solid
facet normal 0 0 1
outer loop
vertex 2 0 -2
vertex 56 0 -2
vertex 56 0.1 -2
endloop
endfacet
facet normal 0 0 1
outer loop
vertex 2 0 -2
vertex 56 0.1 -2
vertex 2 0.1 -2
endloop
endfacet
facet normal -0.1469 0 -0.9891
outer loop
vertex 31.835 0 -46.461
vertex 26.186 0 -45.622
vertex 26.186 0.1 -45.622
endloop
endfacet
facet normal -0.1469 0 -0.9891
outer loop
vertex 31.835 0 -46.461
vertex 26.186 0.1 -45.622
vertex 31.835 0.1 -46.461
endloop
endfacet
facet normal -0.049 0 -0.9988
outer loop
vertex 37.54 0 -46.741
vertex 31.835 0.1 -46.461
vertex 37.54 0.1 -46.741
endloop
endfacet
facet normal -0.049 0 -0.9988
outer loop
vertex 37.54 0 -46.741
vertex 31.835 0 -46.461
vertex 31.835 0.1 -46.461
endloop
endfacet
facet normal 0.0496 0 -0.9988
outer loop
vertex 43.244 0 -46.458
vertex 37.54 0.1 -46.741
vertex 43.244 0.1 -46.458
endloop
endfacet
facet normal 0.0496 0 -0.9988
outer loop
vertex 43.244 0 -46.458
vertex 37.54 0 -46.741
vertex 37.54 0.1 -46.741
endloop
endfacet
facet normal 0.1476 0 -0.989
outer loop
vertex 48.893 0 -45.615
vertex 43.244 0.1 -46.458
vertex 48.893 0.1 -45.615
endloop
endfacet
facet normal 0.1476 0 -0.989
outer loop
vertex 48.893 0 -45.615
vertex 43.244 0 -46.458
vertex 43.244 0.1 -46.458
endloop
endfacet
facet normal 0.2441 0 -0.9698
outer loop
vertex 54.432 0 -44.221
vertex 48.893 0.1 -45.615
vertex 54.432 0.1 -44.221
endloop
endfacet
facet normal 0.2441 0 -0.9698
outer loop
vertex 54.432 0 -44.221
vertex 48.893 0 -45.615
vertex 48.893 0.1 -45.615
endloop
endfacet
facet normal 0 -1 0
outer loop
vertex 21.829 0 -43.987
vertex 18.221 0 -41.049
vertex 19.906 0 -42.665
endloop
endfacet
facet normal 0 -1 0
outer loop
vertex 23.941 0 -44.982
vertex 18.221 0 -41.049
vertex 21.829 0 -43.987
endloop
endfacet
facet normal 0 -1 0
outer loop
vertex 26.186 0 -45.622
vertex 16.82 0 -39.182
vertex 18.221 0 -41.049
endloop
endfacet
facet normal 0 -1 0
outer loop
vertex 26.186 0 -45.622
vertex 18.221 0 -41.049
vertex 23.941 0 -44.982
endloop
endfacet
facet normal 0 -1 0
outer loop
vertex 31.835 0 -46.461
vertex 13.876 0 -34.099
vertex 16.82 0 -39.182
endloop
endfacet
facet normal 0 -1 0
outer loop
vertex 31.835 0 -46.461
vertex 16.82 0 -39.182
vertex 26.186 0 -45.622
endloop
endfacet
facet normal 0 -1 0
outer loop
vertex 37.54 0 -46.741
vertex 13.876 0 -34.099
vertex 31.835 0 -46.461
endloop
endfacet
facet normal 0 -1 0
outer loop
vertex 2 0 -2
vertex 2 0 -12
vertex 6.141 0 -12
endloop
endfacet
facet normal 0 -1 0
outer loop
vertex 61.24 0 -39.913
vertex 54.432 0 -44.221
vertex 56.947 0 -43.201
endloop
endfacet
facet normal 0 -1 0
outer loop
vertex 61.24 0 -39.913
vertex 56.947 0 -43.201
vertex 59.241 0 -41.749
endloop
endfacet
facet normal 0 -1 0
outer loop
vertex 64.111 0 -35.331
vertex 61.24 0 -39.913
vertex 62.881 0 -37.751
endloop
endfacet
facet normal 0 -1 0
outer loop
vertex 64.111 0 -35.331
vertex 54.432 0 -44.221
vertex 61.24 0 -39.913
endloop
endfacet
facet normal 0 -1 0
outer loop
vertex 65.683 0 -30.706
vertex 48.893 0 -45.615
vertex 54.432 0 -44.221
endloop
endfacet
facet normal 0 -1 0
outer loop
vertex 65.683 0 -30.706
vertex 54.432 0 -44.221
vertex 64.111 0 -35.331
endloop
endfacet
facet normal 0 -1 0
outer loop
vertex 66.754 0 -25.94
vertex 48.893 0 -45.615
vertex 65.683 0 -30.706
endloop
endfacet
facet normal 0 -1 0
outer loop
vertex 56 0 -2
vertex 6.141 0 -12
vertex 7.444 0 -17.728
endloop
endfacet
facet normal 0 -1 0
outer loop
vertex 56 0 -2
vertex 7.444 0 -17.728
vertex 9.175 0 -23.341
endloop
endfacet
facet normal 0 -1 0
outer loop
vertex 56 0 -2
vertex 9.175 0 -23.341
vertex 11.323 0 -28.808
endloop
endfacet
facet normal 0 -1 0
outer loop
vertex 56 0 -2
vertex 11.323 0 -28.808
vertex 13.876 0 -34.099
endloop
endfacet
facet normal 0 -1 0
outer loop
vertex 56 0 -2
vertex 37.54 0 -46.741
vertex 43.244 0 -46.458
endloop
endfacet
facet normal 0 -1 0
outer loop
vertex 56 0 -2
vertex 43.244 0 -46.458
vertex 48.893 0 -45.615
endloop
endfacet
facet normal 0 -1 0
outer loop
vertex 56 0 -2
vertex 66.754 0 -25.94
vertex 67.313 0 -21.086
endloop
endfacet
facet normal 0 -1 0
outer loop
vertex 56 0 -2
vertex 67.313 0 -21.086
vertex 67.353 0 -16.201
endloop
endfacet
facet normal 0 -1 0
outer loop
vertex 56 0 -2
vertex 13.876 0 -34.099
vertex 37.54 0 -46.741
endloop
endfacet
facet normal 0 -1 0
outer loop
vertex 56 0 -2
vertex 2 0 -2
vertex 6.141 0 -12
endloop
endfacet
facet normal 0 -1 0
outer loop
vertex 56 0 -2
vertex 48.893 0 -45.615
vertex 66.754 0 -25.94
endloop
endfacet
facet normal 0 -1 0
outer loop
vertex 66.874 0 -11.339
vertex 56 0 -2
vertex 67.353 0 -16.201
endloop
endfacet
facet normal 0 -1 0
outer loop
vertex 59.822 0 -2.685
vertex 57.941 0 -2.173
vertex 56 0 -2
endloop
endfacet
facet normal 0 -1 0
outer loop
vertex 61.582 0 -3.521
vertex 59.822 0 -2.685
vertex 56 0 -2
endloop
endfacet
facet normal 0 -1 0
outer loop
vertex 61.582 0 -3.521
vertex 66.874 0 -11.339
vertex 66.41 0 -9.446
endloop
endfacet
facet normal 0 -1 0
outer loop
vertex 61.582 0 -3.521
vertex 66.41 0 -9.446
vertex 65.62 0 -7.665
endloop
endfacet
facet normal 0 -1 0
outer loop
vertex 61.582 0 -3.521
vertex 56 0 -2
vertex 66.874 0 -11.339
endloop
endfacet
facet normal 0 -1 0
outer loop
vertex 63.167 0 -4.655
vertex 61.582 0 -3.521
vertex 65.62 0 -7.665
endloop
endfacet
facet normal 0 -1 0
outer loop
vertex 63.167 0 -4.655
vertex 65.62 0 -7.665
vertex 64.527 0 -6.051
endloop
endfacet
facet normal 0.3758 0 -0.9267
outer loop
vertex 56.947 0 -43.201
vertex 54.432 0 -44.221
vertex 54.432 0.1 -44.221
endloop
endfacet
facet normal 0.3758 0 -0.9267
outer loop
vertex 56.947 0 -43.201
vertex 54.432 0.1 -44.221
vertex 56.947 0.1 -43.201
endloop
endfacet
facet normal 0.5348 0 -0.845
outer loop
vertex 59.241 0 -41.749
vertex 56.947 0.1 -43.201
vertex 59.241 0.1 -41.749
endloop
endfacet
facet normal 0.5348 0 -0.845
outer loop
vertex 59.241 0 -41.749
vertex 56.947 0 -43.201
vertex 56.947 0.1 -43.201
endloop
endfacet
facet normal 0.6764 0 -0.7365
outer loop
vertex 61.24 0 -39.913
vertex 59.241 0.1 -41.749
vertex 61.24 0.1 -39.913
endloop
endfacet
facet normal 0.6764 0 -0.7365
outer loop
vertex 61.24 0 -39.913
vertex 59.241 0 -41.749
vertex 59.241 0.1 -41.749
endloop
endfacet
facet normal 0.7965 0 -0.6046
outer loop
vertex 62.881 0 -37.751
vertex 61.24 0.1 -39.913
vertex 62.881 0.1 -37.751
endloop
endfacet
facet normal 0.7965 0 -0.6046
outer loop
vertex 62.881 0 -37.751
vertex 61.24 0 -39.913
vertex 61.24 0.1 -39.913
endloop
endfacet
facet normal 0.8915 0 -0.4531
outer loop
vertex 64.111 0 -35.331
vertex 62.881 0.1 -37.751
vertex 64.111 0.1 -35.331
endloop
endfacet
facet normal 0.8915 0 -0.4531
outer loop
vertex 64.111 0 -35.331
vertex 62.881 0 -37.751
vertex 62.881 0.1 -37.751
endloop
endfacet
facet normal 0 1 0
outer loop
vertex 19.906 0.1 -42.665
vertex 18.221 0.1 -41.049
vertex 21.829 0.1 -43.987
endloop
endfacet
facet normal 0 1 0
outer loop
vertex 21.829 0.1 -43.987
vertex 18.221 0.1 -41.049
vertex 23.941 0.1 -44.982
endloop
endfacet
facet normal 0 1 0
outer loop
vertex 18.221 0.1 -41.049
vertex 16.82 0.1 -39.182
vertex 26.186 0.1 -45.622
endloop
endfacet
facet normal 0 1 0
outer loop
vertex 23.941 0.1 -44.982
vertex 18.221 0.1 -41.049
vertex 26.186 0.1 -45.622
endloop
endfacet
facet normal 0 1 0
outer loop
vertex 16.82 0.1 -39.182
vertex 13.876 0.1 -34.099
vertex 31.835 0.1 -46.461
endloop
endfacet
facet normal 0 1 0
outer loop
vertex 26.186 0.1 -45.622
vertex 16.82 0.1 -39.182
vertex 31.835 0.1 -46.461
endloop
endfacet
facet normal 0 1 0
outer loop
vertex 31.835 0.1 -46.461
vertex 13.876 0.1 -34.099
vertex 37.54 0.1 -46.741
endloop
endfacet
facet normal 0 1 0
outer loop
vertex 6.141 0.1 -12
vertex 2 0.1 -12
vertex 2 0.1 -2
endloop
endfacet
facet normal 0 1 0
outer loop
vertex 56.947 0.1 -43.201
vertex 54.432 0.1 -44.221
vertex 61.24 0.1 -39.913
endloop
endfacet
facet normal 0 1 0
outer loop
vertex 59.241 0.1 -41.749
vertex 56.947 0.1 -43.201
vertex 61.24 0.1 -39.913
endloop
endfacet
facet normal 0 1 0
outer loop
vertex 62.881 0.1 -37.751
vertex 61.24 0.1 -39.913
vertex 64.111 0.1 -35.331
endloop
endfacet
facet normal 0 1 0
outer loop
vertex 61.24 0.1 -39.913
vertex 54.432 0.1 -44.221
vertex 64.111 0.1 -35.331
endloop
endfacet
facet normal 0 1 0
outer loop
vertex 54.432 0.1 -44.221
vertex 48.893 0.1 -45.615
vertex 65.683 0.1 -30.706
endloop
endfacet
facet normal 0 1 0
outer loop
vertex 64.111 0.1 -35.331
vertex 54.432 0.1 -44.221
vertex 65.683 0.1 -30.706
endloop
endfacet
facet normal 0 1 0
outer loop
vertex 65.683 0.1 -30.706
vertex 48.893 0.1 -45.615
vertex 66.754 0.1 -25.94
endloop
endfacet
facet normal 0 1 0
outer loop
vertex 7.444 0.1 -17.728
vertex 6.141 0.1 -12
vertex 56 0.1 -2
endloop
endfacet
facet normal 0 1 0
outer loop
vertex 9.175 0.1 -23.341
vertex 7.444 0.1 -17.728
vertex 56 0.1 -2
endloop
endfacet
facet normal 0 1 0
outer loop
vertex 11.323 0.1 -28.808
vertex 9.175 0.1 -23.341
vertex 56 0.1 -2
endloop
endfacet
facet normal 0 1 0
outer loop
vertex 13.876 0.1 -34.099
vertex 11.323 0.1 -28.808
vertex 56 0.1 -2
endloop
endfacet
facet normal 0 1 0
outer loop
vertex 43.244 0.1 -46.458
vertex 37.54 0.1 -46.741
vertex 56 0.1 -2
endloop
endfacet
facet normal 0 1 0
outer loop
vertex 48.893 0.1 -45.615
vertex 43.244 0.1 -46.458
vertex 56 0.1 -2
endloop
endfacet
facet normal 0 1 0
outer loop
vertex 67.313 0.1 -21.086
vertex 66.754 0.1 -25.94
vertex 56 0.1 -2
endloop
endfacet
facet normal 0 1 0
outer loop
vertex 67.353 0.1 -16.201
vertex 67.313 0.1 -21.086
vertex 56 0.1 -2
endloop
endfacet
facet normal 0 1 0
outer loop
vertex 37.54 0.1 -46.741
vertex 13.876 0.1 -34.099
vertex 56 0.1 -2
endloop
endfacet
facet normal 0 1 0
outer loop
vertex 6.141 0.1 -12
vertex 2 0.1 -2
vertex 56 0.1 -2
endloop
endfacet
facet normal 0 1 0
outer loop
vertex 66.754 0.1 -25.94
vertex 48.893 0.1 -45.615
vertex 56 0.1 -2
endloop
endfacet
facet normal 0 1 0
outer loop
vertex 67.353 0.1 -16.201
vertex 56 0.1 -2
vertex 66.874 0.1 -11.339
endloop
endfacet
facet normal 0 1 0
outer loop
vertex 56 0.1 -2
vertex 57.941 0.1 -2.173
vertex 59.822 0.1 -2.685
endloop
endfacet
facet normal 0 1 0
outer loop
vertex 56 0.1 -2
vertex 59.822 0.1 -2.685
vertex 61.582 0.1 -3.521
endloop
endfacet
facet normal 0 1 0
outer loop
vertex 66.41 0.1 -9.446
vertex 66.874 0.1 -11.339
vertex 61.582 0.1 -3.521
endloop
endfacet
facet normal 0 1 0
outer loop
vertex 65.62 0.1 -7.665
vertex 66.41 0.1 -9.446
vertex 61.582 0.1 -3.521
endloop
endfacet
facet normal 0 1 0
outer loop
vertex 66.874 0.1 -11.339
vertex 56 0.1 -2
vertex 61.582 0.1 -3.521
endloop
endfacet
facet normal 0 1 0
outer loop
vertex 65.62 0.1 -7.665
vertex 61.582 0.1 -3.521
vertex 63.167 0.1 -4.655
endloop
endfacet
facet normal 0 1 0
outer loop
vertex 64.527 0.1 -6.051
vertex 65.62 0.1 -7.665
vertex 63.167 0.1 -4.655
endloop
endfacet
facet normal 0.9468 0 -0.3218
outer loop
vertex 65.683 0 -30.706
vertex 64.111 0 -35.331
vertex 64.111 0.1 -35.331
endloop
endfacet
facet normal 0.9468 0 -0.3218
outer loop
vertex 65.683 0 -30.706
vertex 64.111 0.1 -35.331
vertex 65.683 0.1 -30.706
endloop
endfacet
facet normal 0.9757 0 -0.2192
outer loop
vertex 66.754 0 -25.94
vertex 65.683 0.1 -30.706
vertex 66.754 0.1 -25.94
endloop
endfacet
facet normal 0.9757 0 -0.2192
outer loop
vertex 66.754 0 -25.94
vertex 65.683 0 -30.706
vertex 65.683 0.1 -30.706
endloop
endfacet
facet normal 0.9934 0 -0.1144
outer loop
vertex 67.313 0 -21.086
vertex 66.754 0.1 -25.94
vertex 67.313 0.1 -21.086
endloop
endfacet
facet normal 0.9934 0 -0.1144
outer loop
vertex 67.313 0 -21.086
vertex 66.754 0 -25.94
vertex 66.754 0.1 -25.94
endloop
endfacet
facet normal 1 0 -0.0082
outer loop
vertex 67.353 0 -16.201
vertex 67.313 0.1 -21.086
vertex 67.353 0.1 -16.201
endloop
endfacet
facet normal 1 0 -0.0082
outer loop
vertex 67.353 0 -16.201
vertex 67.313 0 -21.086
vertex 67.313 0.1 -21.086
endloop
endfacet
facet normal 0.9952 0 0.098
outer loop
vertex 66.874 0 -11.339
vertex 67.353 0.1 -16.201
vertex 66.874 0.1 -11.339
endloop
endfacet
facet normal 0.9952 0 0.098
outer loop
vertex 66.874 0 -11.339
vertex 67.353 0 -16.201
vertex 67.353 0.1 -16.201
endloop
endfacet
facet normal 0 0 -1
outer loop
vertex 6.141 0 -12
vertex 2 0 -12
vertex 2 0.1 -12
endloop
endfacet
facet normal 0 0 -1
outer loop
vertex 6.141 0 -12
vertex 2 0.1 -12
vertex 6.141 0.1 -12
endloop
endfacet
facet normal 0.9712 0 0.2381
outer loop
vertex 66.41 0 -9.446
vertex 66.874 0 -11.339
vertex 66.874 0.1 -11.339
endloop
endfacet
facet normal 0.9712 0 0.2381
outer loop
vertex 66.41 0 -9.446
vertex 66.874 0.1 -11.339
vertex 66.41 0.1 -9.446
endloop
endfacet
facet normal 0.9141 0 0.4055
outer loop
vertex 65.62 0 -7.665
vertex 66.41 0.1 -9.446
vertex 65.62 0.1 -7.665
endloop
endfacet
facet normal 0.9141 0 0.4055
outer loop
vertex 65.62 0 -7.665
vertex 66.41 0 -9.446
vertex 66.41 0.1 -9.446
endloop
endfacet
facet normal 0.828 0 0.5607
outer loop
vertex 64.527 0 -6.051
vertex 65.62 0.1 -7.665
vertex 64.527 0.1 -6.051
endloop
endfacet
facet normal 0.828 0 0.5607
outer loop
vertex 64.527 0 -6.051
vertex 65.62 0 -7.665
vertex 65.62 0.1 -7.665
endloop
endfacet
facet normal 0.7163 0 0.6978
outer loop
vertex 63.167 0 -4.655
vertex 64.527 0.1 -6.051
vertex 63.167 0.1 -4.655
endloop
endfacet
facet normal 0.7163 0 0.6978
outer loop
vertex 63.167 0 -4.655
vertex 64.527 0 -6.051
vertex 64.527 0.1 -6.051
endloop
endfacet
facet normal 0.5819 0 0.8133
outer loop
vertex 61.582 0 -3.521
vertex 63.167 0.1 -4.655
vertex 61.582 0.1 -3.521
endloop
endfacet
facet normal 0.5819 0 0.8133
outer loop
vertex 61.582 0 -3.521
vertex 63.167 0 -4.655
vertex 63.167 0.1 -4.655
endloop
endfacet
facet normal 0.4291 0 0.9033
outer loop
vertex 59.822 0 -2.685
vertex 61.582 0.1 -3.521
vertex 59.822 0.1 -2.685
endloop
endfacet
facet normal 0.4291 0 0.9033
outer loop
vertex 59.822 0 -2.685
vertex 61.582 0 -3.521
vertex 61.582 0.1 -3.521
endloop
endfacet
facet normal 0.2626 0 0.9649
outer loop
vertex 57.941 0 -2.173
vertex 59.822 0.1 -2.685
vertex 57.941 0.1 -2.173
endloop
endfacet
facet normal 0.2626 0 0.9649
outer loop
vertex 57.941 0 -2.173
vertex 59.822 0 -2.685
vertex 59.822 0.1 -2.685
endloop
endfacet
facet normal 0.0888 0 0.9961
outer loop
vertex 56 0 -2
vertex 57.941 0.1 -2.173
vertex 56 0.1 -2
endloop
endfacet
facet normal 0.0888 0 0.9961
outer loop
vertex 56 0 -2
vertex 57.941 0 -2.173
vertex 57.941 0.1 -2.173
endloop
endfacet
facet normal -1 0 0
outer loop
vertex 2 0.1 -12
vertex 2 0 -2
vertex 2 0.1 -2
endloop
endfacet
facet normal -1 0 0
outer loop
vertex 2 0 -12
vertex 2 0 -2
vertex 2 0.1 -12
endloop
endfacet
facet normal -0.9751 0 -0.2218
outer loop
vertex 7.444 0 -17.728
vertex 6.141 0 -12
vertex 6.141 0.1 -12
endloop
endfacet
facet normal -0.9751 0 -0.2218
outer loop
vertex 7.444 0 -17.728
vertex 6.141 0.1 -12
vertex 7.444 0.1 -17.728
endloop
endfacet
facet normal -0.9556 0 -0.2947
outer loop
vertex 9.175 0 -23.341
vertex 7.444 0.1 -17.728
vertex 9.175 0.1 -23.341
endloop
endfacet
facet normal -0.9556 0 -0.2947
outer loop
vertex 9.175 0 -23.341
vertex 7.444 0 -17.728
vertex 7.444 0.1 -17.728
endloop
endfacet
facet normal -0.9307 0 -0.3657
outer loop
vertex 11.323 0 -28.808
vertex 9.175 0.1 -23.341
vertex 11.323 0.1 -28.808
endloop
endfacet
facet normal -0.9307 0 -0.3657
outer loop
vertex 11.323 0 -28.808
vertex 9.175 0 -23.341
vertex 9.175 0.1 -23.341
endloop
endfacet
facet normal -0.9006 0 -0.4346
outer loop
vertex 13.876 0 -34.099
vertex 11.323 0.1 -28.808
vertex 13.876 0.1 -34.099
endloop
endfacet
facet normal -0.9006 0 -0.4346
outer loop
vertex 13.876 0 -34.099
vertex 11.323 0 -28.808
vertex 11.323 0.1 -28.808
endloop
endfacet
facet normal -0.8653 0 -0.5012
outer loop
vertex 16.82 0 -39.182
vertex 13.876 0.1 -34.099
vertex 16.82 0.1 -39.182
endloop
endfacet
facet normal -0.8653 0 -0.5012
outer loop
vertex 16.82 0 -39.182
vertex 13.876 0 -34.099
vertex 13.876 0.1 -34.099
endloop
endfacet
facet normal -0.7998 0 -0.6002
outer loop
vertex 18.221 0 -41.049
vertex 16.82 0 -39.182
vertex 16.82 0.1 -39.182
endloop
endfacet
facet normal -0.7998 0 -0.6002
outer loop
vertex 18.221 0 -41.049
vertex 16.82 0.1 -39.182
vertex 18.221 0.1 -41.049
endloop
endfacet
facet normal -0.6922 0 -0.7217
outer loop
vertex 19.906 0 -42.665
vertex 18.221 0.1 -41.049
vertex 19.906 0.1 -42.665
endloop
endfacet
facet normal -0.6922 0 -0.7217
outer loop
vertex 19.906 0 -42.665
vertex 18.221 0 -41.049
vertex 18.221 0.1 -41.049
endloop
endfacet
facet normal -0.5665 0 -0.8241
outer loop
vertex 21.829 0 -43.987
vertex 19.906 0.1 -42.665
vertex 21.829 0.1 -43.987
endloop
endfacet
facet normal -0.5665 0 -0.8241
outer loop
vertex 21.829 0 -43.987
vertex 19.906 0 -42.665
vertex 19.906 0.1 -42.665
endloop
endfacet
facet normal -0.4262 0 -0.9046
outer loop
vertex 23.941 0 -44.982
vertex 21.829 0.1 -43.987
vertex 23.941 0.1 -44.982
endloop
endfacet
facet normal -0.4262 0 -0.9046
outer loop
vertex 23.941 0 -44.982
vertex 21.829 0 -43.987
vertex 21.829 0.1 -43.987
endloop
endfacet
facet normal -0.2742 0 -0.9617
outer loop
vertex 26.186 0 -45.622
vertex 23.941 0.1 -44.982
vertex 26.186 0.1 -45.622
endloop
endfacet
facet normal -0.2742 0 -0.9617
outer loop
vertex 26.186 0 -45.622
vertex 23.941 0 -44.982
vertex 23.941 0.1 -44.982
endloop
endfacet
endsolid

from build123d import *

# Parameters (mm, degrees)
F1_DEPTH = 0.1


with BuildPart() as f1:
    # F0 (on Front) → F1 (new body)
    with BuildSketch(Plane.XZ):
        with BuildLine():
            Line((56, -2), (2, -2))
            Line((2, -2), (2, -12))
            Line((2, -12), (6.141136, -12))
            ThreePointArc((6.141136, -12), (10.197054, -26.094991), (16.819916, -39.181508))
            ThreePointArc((16.819916, -39.181508), (20.840447, -43.365146), (26.185783, -45.622329))
            ThreePointArc((26.185783, -45.622329), (40.395564, -46.669439), (54.431857, -44.220605))
            ThreePointArc((54.431857, -44.220605), (60.281606, -40.876074), (64.110749, -35.331427))
            ThreePointArc((64.110749, -35.331427), (67.098581, -23.520382), (66.873925, -11.339354))
            ThreePointArc((66.873925, -11.339354), (63.167039, -4.655328), (56, -2))
        make_face()
    extrude(amount=-F1_DEPTH)


solid = f1.part
